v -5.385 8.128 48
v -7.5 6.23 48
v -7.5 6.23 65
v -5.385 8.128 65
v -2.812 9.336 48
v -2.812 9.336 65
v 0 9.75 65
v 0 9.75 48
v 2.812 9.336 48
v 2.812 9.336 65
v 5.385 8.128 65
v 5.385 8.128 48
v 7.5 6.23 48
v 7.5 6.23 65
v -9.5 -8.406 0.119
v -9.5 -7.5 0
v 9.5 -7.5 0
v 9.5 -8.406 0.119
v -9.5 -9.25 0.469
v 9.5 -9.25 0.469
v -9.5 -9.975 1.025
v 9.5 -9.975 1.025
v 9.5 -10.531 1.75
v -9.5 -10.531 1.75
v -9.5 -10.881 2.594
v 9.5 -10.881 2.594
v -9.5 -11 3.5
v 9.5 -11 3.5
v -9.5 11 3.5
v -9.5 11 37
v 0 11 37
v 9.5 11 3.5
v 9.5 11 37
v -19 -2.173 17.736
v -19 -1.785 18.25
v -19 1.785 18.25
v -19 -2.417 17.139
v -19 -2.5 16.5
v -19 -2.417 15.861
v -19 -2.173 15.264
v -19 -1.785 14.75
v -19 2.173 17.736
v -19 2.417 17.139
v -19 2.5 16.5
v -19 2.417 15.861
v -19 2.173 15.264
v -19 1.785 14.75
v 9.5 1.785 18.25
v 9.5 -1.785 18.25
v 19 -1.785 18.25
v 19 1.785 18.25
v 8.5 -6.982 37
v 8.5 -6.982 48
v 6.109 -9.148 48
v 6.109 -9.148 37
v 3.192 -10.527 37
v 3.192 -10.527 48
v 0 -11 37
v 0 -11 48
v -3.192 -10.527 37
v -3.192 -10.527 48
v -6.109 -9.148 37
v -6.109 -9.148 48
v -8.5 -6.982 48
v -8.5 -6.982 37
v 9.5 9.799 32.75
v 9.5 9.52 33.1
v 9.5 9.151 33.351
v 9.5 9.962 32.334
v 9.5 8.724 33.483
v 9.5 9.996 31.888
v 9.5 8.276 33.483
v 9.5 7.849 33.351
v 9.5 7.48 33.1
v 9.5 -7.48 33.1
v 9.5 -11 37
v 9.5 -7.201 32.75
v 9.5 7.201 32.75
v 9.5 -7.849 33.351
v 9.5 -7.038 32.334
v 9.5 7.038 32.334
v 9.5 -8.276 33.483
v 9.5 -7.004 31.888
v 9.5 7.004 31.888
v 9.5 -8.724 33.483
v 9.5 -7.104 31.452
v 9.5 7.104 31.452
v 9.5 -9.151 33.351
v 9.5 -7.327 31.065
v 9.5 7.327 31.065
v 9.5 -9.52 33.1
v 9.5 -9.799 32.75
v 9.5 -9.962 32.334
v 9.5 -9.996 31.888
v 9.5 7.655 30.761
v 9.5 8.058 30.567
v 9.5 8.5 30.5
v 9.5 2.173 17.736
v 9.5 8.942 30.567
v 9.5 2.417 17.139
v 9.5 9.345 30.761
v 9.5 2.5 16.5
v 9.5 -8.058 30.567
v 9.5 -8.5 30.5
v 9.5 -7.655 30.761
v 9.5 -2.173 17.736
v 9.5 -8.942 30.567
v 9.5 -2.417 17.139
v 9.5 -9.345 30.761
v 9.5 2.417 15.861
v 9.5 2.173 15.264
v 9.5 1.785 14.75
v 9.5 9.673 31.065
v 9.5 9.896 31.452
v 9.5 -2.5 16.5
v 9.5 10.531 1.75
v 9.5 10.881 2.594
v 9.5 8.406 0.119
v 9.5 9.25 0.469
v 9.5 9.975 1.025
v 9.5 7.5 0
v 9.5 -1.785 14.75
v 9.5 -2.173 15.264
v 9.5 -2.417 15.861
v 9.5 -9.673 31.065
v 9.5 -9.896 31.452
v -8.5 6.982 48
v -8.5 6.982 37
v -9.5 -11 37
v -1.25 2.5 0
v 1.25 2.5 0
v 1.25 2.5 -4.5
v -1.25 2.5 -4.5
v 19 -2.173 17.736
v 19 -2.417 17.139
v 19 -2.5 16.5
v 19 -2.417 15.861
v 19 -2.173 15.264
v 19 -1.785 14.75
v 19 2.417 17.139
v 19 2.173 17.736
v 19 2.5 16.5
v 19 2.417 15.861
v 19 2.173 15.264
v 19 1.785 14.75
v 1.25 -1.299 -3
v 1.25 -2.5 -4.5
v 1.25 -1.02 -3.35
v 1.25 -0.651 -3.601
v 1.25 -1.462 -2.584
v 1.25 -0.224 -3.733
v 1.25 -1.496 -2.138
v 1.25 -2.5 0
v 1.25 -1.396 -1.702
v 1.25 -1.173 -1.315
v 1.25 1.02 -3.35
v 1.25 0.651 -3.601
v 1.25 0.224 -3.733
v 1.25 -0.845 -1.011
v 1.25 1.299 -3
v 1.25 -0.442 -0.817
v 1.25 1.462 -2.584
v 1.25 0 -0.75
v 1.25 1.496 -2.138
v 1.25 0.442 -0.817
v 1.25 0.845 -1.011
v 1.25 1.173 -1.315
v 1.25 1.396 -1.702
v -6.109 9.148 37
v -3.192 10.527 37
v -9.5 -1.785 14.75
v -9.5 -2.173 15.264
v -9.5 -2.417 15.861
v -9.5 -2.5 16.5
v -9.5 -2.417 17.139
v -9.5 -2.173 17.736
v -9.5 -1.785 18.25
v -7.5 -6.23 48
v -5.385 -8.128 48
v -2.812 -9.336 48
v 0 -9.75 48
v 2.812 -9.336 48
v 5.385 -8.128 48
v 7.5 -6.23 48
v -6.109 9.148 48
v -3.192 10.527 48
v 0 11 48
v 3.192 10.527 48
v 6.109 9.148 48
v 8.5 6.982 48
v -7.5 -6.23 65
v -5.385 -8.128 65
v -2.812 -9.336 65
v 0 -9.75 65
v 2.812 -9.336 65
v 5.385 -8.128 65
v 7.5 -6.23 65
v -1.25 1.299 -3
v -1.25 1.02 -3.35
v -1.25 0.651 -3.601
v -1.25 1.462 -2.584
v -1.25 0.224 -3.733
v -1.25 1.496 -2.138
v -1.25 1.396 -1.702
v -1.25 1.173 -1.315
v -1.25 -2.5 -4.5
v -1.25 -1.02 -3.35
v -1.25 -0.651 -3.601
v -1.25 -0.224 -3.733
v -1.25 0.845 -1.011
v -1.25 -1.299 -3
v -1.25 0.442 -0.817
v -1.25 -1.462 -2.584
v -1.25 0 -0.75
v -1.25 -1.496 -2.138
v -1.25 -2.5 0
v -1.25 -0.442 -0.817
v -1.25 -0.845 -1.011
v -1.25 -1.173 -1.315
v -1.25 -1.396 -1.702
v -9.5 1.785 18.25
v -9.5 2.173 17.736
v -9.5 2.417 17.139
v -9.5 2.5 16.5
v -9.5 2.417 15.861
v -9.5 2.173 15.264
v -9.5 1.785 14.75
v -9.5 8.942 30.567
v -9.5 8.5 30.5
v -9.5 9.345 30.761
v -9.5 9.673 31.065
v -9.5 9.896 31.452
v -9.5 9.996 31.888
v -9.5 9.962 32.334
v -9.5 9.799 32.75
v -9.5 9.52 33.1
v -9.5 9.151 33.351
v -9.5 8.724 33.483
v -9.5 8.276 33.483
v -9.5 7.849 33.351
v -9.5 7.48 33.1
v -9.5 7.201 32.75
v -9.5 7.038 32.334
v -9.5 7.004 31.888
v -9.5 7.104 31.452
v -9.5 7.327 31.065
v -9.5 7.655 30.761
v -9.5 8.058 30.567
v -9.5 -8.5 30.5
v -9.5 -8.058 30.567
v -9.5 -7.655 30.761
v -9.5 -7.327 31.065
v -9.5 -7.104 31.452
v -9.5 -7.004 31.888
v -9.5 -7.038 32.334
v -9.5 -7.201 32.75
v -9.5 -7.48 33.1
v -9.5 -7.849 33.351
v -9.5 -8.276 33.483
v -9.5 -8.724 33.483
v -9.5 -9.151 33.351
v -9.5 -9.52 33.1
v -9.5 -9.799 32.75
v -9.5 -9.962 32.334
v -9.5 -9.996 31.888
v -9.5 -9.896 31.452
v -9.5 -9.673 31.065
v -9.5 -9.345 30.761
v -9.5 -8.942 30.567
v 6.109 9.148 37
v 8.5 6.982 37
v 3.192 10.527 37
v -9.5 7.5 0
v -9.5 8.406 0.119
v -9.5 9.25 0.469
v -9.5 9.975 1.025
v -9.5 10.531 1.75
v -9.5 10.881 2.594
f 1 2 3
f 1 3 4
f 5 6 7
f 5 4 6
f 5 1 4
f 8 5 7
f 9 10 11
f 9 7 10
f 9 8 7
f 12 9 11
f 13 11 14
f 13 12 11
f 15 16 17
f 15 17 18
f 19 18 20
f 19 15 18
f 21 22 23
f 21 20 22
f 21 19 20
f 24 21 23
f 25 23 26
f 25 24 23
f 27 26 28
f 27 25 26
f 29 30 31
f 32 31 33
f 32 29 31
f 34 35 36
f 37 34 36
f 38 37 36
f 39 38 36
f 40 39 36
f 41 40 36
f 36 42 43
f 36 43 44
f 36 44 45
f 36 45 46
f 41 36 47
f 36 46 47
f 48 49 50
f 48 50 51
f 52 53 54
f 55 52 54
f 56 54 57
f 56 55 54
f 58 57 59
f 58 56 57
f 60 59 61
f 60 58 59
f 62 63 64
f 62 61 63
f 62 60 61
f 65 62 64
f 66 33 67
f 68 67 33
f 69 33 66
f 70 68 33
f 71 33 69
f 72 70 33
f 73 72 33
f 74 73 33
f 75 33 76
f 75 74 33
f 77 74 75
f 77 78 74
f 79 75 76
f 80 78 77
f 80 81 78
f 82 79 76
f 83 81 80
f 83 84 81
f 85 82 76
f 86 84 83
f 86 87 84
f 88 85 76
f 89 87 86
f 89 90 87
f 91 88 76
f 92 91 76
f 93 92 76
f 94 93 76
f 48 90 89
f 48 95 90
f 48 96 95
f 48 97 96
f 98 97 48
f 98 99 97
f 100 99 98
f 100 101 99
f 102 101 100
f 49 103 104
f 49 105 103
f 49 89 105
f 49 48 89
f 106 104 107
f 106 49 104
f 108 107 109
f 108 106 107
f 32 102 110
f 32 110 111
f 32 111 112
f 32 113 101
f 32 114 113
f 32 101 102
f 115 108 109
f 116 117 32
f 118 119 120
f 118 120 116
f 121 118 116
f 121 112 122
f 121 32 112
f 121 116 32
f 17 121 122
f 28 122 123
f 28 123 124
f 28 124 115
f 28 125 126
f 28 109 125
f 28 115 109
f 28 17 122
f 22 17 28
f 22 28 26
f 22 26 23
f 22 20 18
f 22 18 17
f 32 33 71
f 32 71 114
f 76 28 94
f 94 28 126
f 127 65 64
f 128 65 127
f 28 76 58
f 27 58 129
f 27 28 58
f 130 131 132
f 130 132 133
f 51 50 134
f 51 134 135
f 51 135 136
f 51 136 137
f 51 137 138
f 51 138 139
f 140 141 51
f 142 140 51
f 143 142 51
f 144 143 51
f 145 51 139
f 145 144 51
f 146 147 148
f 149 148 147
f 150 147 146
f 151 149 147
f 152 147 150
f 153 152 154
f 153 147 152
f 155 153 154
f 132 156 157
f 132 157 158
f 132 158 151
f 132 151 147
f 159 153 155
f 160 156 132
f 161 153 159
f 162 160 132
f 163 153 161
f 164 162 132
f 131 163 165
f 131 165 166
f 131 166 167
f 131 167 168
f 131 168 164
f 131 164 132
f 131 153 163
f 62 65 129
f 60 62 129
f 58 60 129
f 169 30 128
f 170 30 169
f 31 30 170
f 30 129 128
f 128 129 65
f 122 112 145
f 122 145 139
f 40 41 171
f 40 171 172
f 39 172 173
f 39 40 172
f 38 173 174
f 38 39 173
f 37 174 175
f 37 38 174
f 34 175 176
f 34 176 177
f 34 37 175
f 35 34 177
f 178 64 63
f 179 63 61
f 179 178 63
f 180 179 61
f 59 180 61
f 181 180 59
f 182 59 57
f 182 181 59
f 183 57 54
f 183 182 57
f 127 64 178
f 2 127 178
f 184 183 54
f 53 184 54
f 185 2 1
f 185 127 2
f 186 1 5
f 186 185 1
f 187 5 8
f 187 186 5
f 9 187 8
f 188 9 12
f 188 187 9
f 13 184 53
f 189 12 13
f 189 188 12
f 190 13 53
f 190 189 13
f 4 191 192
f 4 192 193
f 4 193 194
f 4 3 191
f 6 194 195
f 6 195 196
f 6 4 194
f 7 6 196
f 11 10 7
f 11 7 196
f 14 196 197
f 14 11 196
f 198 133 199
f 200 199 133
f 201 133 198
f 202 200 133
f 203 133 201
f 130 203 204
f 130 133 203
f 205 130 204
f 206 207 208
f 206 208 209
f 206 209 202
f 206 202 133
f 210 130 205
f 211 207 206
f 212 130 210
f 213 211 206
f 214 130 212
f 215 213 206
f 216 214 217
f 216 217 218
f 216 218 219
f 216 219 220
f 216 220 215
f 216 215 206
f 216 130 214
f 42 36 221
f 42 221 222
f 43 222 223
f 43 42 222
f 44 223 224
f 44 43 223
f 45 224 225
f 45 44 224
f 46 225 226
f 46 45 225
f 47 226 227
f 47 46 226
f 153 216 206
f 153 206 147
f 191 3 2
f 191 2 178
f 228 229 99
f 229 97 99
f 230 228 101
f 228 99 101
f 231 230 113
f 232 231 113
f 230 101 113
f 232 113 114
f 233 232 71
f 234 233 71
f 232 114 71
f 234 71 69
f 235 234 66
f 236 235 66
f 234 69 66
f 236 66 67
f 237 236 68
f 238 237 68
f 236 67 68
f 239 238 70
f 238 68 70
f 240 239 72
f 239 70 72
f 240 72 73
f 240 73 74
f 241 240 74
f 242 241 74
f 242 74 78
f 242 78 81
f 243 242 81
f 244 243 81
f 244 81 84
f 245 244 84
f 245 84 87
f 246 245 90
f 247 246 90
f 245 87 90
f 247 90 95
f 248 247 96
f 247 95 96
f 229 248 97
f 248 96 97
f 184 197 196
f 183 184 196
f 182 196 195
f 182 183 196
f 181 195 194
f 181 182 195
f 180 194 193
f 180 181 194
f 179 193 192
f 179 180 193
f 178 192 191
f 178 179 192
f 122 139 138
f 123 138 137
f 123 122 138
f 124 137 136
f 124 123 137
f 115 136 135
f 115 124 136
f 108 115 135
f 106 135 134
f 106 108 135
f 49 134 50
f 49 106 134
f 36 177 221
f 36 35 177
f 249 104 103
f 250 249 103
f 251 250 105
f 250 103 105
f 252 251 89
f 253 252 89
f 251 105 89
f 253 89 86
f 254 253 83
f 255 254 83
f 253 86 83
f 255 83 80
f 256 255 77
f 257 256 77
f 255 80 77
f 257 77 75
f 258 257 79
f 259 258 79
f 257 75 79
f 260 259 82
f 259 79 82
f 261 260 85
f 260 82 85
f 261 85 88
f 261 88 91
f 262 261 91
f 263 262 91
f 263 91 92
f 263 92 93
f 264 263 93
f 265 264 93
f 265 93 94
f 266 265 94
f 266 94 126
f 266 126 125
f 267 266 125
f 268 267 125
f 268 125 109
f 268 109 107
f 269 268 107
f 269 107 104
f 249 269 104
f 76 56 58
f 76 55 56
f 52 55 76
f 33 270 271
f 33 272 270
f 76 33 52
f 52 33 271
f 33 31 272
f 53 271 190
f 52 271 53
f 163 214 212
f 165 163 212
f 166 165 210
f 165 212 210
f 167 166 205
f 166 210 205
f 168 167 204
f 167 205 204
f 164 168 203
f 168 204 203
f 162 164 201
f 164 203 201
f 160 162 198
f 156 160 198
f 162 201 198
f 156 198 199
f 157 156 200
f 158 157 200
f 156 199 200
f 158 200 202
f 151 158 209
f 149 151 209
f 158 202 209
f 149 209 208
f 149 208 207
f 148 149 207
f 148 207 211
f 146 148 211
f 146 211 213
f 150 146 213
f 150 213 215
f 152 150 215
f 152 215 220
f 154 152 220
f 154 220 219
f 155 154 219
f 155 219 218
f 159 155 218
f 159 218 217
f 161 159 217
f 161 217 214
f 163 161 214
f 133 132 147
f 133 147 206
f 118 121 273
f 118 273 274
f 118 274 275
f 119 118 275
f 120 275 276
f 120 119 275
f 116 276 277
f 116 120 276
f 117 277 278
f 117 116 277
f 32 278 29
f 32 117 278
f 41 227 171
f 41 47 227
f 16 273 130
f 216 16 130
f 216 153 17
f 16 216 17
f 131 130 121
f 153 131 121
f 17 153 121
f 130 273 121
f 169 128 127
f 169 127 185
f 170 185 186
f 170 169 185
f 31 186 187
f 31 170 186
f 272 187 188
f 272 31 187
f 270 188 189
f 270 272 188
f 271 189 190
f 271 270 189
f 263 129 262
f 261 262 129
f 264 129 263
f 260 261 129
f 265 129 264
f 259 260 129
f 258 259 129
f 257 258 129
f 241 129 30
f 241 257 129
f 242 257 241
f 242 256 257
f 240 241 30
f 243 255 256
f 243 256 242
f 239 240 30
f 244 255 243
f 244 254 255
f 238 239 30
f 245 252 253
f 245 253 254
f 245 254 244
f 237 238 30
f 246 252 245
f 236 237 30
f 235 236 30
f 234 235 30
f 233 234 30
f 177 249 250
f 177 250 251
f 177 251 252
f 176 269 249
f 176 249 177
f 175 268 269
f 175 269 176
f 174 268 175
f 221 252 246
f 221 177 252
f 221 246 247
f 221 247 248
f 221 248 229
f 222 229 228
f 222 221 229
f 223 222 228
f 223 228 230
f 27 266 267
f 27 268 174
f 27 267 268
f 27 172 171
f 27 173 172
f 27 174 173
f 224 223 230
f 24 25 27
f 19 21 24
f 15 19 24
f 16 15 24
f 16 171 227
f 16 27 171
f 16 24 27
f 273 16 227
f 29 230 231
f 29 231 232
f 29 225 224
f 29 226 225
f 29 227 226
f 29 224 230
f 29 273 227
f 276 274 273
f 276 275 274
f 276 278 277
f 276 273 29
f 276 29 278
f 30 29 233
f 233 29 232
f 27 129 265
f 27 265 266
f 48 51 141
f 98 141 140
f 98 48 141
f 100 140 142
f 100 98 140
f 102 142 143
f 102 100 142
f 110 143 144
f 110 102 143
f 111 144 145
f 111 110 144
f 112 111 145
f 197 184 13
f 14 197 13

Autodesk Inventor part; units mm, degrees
ref_plane "YZ Plane" through (0, 0, 0) normal (1, 0, 0) x (0, 1, 0)
ref_plane "XZ Plane" through (0, 0, 0) normal (0, 1, 0) x (-1, 0, 0)
ref_plane "XY Plane" through (0, 0, 0) normal (0, 0, 1) x (1, 0, 0)
sketch "Эскиз1" plane through (0, 0, 0) normal (0, 0, 1) x (1, 0, 0)
  line L0 (9.5, -11) -> (-9.5, -11)
  line L1 (-9.5, -11) -> (-9.5, 11)
  line L2 (-9.5, 11) -> (9.5, 11)
  line L3 (9.5, 11) -> (9.5, -11)
  line L4 (9.5, -11) -> (-9.5, 11) construction
  line L5 (-9.5, -11) -> (9.5, 11) construction
  point P0 (0, 0)
  dimension "d0" = 19
  dimension "d1" = 22
extrude "Выдавливание1" add sketch "Эскиз1" along normal blind 37
sketch "Эскиз2" plane through (0, 0, 37) normal (0, 0, 1) x (1, 0, 0)
  circle A0 centre (0, 0) radius 11
  line L0 (8.5, -20.0649) -> (-8.5, -20.0649)
  line L1 (-8.5, -20.0649) -> (-8.5, 20.0649)
  line L2 (-8.5, 20.0649) -> (8.5, 20.0649)
  line L3 (8.5, 20.0649) -> (8.5, -20.0649)
  line L4 (8.5, -20.0649) -> (-8.5, 20.0649) construction
  line L5 (-8.5, -20.0649) -> (8.5, 20.0649) construction
  point P0 (8.5, -6.9821)
  point P1 (8.5, 6.9821)
  point P2 (-8.5, 6.9821)
  point P3 (-8.5, -6.9821)
  dimension "d4" = 22
  dimension "d5" = 17
extrude "Выдавливание2" add sketch "Эскиз2" along normal blind 11 contours L3 A0 L1
sketch "Эскиз3" plane through (9.5, -11, 0) normal (1, 0, 0) x (0, 0, -1)
  circle A0 centre (-32, 19.5) radius 1.5
  line L0 (-37, 0) -> (-37, 22) projected
  line L1 (0, 22) -> (-37, 22) projected
  line L2 (-37, 4.0179) -> (-37, 17.9821) projected
  line L3 (-37, 11) -> (0, 11)
  line L4 (0, 0) -> (0, 22) projected
  circle A1 centre (-32, 2.5) radius 1.5
  dimension "d8" = 3
  dimension "d9" = 5
  dimension "d10" = 2.5
extrude "Выдавливание3" cut sketch "Эскиз3" against normal through all contours A0 | A1
sketch "Эскиз4" plane through (9.5, -11, 0) normal (1, 0, 0) x (0, 0, -1)
  circle A0 centre (-16.5, 11) radius 2.5
  line L0 (0, 0) -> (0, 22) projected
  line L1 (0, 0) -> (-37, 0) projected
  line L2 (-14.75, 6.8216) -> (-18.25, 6.8216)
  line L3 (-18.25, 6.8216) -> (-18.25, 15.1784)
  line L4 (-18.25, 15.1784) -> (-14.75, 15.1784)
  line L5 (-14.75, 15.1784) -> (-14.75, 6.8216)
  line L6 (-14.75, 6.8216) -> (-18.25, 15.1784) construction
  line L7 (-18.25, 6.8216) -> (-14.75, 15.1784) construction
  point P0 (0, 11)
  point P1 (-14.75, 9.2146)
  point P2 (-14.75, 12.7854)
  point P3 (-18.25, 12.7854)
  point P4 (-18.25, 9.2146)
  dimension "d13" = 5
  dimension "d14" = 16.5
  dimension "d15" = 11
  dimension "d16" = 3.5
extrude "Выдавливание4" add sketch "Эскиз4" along normal blind 9.5 and the other way blind 28.5 contours L5 A0 L3
sketch "Эскиз5" plane through (0, 0, 48) normal (0, 0, 1) x (1, 0, 0)
  circle A0 centre (0, 0) radius 9.75
  line L0 (7.5, 17.2473) -> (-7.5, 17.2473)
  line L1 (-7.5, 17.2473) -> (-7.5, -17.2473)
  line L2 (-7.5, -17.2473) -> (7.5, -17.2473)
  line L3 (7.5, -17.2473) -> (7.5, 17.2473)
  line L4 (7.5, 17.2473) -> (-7.5, -17.2473) construction
  line L5 (-7.5, 17.2473) -> (7.5, -17.2473) construction
  point P0 (7.5, -6.23)
  point P1 (7.5, 6.23)
  point P2 (-7.5, 6.23)
  point P3 (-7.5, -6.23)
  dimension "d21" = 19.5
  dimension "d22" = 15
extrude "Выдавливание5" add sketch "Эскиз5" along normal blind 17 contours L3 A0 L1
fillet "Сопряжение1" radius 3.5 2 edges at (0, -11, 0) (0, 11, 0)
sketch "Эскиз6" plane through (0, 0, 0) normal (0, 0, -1) x (-1, 0, 0)
  line L0 (-1.25, 2.5) -> (1.25, 2.5)
  line L1 (1.25, 2.5) -> (1.25, -2.5)
  line L2 (1.25, -2.5) -> (-1.25, -2.5)
  line L3 (-1.25, -2.5) -> (-1.25, 2.5)
  line L4 (-1.25, 2.5) -> (1.25, -2.5) construction
  line L5 (1.25, 2.5) -> (-1.25, -2.5) construction
  point P0 (0, 0)
  dimension "d26" = 2.5
  dimension "d27" = 5
extrude "Выдавливание6" add sketch "Эскиз6" along normal blind 4.5
sketch "Эскиз7" plane through (-1.25, -2.5, 0) normal (-1, 0, 0) x (0, 0, 1)
  line L0 (0, 0) -> (-4.5, 0) projected
  line L1 (0, 5) -> (-4.5, 5) projected
  line L2 (-4.5, 0) -> (-4.5, 5) projected
  line L3 (-4.5, 2.5) -> (0, 2.5)
  circle A0 centre (-2.25, 2.5) radius 1.5
  dimension "d31" = 3
extrude "Выдавливание7" cut sketch "Эскиз7" against normal through all
properties part number "мотор лол"
